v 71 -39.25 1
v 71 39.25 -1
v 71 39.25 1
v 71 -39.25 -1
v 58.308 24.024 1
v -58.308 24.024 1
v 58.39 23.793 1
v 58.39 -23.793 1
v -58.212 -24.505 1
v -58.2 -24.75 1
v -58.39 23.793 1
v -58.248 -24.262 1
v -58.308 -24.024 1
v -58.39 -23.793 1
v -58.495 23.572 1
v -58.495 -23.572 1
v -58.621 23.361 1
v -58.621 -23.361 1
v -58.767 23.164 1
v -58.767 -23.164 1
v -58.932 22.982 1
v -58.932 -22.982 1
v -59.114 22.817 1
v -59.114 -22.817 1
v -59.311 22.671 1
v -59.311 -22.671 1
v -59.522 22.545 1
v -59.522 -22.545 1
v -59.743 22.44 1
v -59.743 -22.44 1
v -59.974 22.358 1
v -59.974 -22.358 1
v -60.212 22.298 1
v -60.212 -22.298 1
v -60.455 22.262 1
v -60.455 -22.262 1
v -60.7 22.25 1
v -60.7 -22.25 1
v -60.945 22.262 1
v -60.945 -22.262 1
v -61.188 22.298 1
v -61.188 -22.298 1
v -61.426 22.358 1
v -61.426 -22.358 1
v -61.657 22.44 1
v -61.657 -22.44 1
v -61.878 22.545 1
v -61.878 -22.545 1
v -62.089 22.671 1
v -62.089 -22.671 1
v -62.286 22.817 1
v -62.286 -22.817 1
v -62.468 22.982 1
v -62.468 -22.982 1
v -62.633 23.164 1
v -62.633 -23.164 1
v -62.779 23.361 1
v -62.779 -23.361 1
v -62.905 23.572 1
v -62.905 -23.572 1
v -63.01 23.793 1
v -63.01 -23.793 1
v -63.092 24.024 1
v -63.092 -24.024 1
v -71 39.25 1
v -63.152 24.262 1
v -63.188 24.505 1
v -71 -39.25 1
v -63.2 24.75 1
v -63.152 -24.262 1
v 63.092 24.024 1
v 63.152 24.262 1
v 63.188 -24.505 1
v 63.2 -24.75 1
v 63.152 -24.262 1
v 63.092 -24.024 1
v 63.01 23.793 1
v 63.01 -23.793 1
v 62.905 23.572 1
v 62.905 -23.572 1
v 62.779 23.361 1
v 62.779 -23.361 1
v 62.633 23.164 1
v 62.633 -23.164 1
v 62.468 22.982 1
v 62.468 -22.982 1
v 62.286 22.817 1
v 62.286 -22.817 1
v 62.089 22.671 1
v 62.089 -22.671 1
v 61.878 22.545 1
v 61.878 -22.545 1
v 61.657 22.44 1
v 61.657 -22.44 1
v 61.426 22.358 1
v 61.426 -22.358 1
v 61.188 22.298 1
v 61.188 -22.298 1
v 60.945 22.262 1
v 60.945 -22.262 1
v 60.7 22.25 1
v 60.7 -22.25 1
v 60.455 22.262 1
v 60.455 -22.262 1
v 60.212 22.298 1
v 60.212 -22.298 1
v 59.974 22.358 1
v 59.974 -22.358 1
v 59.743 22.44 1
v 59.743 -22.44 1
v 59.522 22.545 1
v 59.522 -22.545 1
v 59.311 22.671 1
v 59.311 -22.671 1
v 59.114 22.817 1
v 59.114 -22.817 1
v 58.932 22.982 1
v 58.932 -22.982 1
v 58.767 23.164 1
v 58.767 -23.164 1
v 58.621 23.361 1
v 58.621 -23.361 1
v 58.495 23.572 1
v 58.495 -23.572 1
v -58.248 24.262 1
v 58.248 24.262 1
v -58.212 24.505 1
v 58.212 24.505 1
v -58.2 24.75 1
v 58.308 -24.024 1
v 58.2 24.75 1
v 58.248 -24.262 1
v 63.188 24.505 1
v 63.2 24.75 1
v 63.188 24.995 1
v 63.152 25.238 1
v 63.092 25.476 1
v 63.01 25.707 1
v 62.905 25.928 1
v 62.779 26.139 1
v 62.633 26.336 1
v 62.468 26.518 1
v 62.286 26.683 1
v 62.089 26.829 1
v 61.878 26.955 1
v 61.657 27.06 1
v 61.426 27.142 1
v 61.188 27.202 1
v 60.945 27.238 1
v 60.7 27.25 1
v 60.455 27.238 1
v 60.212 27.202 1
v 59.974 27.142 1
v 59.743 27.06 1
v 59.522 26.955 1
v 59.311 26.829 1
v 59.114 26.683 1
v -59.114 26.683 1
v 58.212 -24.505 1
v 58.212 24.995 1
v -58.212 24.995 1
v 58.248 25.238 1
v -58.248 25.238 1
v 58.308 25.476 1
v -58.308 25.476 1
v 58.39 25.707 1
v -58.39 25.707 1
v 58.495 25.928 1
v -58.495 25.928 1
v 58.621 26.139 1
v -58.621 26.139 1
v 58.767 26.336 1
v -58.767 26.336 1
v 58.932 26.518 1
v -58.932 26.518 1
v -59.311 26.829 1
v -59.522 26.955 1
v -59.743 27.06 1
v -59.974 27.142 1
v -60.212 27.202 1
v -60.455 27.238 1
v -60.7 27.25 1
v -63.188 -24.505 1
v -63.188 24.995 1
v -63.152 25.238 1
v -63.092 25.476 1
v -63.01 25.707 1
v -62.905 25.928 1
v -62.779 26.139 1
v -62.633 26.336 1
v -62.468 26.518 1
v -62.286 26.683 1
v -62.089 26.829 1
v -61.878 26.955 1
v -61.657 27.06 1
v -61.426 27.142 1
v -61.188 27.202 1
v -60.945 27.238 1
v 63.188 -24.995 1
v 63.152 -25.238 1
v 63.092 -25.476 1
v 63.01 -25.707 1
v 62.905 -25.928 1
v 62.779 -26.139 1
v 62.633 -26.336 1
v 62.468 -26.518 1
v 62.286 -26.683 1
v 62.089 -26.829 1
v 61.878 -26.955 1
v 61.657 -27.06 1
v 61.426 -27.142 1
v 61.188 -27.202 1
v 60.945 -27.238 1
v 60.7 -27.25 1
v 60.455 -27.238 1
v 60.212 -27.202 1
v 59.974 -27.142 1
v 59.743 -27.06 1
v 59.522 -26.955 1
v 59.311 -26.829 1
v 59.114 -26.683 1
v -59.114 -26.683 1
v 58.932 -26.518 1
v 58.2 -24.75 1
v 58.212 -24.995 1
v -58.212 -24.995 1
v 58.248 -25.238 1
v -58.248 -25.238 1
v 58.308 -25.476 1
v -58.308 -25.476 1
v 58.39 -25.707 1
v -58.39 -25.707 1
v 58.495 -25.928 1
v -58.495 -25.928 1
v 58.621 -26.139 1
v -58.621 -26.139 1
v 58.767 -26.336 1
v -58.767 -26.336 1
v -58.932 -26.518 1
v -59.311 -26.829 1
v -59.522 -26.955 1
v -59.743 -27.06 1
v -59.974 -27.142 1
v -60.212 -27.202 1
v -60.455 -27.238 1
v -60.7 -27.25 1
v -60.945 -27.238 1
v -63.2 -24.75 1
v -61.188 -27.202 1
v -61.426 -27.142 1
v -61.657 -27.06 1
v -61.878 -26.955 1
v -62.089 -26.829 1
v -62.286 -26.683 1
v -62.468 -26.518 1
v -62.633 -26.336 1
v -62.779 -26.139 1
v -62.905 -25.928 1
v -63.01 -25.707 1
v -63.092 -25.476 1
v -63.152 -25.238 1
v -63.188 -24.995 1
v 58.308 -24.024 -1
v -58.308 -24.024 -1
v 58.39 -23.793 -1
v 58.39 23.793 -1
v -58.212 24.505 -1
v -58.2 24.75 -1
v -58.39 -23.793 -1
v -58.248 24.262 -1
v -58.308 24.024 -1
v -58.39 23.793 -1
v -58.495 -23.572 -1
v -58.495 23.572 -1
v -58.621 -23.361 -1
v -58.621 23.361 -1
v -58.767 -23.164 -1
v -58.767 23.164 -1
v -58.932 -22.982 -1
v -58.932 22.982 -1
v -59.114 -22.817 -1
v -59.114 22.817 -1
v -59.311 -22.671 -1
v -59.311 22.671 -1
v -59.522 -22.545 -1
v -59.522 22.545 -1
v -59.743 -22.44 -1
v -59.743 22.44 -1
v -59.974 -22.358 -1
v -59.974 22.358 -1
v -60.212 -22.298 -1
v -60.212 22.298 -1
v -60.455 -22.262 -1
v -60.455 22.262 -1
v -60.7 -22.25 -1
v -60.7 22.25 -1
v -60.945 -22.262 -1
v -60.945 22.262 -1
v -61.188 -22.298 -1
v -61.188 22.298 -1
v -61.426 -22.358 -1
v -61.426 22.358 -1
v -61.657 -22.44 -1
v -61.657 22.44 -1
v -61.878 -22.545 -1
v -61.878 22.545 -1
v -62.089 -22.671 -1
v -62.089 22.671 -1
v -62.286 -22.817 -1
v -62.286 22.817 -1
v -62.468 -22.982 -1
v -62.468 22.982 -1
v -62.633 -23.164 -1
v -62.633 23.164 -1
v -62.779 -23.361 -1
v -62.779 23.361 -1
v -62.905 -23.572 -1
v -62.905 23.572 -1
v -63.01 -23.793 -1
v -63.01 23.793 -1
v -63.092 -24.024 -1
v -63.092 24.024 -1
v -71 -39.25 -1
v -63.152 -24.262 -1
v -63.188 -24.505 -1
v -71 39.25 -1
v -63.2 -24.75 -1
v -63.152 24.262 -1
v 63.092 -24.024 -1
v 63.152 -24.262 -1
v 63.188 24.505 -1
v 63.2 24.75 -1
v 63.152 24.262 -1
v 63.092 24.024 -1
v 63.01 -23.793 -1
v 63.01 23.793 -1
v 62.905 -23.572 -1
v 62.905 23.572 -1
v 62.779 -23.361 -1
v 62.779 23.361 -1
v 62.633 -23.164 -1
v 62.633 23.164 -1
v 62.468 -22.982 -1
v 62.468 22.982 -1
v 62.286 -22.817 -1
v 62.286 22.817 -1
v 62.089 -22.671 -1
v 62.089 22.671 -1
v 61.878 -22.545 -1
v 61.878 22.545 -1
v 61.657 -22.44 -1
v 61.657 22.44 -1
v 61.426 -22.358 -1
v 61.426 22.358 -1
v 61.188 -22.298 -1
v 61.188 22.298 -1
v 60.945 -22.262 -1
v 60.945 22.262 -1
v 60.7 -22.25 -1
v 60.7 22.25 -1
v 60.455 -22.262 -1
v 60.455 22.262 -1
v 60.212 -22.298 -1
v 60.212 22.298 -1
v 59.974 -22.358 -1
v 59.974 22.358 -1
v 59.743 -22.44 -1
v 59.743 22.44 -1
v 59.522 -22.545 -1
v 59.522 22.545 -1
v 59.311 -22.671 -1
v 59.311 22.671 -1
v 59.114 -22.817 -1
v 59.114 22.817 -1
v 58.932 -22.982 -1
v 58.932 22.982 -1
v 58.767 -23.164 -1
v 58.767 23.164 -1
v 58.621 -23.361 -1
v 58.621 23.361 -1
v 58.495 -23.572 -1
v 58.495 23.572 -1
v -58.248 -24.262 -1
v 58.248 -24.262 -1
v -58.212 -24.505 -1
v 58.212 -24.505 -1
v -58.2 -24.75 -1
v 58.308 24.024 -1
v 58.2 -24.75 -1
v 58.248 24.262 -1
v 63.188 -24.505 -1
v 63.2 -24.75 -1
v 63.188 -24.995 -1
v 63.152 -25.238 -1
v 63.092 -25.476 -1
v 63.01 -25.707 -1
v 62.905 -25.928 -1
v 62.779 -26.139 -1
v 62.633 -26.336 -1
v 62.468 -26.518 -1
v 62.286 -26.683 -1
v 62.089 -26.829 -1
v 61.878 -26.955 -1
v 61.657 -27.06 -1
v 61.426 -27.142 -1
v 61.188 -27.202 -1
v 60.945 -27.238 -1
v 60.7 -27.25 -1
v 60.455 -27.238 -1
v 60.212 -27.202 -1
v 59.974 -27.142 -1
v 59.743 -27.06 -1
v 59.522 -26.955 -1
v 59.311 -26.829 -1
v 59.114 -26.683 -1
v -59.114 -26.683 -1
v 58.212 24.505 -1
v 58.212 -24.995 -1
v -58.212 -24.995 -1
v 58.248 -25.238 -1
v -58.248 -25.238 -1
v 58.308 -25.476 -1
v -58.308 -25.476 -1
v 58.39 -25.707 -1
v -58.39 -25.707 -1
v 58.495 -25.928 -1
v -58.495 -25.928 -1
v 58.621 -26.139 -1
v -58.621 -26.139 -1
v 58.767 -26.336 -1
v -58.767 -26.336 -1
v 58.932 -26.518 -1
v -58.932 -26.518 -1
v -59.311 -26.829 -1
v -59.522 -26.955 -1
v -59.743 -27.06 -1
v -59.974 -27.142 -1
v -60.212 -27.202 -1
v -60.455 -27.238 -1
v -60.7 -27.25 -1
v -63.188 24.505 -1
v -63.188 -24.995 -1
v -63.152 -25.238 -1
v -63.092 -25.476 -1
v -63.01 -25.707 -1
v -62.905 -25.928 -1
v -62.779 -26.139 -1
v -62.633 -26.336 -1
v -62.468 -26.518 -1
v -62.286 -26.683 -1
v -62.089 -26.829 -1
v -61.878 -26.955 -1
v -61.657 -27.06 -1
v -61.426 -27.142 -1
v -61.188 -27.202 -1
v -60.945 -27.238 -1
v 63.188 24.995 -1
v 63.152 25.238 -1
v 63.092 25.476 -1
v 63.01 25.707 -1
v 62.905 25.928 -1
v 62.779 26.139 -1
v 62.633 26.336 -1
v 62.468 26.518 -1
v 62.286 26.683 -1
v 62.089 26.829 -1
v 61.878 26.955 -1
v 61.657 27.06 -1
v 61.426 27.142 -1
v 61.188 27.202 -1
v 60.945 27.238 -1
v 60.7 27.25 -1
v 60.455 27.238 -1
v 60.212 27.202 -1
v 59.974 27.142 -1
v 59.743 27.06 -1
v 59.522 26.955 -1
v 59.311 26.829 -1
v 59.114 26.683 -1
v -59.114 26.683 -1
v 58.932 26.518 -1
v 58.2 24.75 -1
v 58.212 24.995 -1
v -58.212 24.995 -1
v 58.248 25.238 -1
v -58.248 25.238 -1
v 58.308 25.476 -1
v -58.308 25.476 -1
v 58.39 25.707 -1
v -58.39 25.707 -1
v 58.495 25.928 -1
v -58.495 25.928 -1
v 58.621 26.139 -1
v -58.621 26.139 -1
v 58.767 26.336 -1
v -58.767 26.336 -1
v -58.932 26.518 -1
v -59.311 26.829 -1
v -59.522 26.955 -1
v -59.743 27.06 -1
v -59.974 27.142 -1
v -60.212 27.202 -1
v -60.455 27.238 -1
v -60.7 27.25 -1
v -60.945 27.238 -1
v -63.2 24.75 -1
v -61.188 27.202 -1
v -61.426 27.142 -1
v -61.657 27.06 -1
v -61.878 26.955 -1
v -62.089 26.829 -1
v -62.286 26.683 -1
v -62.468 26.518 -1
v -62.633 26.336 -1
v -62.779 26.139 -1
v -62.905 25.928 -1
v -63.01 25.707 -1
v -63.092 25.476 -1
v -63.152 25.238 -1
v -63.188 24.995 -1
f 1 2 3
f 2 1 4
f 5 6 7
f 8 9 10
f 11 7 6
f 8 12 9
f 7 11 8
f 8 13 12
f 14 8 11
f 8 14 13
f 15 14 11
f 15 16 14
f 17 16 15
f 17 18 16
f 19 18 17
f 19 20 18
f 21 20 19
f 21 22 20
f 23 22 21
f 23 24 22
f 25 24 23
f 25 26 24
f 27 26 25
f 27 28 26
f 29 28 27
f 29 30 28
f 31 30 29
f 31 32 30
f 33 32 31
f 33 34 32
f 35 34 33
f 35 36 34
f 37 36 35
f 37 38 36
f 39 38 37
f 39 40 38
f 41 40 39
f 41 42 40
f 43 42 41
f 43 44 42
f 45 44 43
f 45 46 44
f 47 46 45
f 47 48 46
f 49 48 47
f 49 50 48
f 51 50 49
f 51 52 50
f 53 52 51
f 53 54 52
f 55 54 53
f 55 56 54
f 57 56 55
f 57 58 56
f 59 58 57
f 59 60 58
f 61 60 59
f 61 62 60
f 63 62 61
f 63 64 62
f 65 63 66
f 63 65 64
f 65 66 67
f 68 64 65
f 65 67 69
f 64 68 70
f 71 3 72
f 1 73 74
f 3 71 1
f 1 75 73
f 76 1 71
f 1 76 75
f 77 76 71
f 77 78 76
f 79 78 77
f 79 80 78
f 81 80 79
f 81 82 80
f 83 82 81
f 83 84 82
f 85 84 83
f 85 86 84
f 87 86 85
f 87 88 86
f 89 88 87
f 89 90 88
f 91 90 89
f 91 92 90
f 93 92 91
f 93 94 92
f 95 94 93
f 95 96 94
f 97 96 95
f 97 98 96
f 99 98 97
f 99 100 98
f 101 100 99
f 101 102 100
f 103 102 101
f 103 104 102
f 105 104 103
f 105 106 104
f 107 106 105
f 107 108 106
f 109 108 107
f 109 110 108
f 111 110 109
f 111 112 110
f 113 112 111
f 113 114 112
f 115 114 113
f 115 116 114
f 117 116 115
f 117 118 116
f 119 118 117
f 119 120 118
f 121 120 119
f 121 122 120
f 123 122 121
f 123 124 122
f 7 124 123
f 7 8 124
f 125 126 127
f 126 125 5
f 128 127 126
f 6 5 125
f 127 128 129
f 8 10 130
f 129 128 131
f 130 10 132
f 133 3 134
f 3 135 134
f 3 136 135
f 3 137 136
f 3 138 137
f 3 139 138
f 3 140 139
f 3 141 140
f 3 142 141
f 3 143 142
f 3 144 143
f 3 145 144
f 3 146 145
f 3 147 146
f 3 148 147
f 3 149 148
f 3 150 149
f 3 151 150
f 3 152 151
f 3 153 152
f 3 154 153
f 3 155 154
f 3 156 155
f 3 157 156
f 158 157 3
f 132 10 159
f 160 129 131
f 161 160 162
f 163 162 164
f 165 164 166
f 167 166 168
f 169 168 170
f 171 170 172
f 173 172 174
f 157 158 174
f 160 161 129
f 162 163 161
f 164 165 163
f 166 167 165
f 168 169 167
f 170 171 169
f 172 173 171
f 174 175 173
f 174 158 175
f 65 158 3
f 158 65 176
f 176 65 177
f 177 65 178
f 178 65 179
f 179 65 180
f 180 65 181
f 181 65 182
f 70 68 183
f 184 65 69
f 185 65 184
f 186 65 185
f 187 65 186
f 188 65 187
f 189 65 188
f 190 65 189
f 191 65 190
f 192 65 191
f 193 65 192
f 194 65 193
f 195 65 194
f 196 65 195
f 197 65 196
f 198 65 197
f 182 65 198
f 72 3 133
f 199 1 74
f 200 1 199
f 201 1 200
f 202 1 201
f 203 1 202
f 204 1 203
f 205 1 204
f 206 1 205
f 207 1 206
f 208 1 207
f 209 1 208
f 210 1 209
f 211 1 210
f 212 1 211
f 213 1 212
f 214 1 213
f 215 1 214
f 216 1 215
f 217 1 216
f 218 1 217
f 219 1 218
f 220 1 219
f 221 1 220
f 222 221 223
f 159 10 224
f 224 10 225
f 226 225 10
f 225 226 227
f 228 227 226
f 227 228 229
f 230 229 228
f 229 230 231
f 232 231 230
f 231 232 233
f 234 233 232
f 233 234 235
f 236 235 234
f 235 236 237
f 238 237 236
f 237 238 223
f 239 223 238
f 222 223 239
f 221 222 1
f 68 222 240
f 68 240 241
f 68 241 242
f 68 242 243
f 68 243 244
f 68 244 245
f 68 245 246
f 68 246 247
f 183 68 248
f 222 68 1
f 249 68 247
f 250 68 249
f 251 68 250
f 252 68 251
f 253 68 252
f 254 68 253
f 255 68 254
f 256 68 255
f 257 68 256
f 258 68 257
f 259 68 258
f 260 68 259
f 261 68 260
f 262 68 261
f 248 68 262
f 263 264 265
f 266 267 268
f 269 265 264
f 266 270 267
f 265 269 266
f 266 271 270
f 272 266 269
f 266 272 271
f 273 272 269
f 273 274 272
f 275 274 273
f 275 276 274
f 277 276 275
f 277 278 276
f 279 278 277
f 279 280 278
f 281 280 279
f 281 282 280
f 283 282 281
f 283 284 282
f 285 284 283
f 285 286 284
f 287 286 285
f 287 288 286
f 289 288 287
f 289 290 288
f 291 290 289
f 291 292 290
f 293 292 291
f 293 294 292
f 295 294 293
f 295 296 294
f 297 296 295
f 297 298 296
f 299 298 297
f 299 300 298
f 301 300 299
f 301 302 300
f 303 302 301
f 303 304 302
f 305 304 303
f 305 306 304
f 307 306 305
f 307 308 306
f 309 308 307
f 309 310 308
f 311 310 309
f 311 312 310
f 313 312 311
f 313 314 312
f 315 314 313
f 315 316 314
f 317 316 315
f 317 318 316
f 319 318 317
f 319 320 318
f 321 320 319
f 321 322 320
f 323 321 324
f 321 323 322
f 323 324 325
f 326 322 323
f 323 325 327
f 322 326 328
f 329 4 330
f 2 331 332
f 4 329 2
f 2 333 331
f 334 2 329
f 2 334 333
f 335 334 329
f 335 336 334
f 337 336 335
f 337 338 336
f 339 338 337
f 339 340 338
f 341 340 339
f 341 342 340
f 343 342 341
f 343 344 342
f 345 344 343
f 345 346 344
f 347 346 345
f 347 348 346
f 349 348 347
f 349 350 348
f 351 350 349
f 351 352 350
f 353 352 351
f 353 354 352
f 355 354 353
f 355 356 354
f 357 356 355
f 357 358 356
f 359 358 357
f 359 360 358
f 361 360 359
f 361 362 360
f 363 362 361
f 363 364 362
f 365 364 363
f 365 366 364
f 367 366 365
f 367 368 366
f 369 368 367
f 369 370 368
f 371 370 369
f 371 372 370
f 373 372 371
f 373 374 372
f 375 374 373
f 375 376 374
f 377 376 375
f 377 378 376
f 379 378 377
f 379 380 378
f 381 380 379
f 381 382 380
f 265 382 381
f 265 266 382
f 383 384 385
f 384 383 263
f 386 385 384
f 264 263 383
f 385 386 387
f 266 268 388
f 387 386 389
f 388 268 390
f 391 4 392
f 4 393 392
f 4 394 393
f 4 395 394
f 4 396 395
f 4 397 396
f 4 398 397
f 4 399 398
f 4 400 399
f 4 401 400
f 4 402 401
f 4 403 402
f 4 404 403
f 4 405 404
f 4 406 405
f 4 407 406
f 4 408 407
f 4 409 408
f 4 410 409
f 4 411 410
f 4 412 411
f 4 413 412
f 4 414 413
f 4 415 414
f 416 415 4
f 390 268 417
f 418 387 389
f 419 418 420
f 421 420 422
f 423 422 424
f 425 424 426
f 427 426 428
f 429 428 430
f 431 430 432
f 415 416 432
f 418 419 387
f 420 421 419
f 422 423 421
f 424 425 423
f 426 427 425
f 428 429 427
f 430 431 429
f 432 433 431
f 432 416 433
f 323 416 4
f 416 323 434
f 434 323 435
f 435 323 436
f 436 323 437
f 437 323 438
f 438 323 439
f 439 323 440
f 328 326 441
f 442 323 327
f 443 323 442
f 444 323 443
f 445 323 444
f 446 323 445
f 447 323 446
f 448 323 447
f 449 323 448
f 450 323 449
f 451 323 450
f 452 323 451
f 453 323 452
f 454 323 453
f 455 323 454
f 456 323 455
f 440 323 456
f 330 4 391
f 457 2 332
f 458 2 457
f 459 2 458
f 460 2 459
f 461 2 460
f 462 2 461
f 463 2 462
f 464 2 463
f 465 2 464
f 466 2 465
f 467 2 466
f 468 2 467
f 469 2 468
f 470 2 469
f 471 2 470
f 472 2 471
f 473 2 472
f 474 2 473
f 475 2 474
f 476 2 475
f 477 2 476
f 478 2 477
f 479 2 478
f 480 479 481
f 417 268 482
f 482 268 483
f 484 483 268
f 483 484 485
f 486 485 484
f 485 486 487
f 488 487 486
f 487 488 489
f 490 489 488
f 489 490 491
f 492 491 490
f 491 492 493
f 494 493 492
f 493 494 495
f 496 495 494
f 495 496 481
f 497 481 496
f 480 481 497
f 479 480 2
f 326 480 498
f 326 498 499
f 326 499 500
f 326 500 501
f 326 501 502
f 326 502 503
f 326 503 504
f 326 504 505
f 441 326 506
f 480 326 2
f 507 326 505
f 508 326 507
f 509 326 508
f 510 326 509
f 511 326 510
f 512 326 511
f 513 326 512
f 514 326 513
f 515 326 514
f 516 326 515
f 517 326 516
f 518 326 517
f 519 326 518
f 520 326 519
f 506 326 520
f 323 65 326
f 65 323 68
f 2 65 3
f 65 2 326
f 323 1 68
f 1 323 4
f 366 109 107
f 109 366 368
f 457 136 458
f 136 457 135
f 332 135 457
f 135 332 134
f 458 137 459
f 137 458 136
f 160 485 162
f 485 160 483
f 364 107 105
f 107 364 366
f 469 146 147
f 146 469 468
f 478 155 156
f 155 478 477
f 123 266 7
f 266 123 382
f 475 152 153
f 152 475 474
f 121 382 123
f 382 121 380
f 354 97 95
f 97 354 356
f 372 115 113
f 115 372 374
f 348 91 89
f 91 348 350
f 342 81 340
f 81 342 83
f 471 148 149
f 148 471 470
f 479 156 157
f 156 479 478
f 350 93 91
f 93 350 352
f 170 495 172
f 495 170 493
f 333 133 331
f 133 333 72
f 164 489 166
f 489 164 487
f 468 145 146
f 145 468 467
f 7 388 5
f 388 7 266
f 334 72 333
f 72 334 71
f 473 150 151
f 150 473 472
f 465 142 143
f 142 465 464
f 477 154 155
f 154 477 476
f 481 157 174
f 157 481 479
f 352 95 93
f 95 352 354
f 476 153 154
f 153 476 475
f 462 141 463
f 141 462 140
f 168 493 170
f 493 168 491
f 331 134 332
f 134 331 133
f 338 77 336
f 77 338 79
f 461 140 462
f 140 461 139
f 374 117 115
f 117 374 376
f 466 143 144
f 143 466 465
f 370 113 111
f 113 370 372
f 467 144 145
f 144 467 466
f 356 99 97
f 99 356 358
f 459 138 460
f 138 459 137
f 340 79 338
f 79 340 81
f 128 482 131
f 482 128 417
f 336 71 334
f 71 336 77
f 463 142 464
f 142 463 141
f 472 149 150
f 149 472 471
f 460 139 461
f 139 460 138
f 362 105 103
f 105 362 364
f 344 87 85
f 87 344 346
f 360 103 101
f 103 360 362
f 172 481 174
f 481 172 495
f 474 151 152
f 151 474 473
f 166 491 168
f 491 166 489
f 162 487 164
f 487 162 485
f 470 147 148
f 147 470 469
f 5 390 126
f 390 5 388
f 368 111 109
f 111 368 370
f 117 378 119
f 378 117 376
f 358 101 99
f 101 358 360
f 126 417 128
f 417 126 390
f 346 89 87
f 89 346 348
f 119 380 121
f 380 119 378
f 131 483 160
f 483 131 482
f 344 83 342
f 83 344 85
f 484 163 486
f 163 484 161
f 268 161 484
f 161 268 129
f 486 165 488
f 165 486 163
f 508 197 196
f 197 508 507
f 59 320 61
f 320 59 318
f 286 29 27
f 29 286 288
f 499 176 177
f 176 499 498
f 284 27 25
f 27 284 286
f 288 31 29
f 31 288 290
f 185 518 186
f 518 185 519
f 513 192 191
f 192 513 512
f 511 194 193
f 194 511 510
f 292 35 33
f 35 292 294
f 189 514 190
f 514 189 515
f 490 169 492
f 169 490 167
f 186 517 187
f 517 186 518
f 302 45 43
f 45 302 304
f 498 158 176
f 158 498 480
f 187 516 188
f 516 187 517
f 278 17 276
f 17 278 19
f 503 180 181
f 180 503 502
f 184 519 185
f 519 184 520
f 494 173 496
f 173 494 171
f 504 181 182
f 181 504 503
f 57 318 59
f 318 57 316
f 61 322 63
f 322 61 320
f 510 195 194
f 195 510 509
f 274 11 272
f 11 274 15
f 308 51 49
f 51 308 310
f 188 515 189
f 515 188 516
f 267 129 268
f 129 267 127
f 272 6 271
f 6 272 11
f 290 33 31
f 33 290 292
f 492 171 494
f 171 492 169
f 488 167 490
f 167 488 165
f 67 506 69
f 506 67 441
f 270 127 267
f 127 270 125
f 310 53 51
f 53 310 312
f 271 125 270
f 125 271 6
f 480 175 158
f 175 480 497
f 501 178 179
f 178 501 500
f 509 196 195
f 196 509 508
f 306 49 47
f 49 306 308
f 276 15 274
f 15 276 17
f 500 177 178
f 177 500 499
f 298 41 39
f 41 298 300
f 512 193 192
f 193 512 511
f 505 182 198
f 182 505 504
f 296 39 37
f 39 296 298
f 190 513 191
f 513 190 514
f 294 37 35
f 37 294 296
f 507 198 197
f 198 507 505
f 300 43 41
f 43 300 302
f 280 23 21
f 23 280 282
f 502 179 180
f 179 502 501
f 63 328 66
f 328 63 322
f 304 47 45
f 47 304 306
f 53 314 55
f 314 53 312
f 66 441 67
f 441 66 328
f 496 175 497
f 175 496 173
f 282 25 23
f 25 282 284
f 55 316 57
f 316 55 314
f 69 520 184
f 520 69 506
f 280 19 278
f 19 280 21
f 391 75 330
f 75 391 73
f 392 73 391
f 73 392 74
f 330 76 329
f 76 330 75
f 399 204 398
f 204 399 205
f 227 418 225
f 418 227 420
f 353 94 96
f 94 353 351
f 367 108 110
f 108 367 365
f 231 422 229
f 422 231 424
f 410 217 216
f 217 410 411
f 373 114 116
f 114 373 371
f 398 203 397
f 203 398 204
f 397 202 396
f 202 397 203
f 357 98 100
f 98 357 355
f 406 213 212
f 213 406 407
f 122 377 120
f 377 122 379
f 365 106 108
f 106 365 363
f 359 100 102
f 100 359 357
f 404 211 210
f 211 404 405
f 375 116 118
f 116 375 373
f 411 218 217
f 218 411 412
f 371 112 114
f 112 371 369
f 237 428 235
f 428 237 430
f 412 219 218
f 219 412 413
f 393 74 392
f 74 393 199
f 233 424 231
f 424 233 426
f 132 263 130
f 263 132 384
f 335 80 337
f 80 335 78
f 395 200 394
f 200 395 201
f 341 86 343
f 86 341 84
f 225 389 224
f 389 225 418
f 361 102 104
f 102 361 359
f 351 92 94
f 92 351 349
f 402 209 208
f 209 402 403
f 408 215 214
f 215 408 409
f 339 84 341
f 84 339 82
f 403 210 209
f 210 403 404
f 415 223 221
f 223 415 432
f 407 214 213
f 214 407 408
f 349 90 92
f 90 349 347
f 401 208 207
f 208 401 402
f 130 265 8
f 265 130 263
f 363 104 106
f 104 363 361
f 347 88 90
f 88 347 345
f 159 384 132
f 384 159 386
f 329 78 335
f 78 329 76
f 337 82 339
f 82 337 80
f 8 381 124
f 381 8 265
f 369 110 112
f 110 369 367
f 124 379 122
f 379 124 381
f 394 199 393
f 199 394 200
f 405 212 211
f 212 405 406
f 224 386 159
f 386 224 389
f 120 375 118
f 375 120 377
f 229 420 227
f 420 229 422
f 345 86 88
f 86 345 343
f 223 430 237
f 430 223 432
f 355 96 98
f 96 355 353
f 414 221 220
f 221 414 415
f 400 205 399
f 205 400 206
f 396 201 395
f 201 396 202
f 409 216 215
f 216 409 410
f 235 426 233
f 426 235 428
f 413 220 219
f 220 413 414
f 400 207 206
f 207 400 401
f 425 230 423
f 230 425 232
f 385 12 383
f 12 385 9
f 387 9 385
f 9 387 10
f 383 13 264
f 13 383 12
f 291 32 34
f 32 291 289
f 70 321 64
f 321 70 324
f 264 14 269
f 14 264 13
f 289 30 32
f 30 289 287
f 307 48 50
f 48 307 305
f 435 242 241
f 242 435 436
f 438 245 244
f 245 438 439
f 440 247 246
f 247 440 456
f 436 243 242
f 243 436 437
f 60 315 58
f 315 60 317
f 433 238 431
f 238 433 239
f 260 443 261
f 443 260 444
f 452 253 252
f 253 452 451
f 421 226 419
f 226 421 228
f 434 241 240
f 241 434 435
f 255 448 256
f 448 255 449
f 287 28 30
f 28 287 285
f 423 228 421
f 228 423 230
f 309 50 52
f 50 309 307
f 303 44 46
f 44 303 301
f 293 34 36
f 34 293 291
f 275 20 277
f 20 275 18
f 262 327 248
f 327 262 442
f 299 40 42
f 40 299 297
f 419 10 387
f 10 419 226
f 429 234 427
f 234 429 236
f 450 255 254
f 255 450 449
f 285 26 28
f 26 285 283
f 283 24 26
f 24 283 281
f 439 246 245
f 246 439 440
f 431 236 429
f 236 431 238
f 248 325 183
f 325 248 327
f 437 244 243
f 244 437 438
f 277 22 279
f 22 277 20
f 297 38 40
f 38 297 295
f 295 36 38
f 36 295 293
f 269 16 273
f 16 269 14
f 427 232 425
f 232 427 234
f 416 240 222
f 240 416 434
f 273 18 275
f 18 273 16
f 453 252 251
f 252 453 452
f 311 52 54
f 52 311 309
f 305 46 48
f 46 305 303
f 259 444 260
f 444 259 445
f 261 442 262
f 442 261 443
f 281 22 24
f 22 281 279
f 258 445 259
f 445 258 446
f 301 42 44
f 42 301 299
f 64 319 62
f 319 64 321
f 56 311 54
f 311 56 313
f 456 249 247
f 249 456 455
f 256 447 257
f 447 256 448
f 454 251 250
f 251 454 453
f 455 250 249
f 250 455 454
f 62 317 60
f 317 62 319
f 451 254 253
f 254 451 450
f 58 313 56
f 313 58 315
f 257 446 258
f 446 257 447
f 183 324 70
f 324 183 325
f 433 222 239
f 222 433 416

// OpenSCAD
//Make this as functions so accessable outside of file
function mountplate_depth()=78.5;
function mountplate_width()=142;
function mountplate_thickness()=2;

module mountplate()
{
    hole_diameter=5;
    hole_frontback=12+hole_diameter/2;
    hole_side=7.8+hole_diameter/2;
    
    thickness=mountplate_thickness();
    width=mountplate_width();
    depth=mountplate_depth();
    
    hole_x=width/2-hole_side;
    hole_y=depth/2-hole_frontback;
    
    difference()
    {
        cube([width,depth,thickness],center=true);
        translate([hole_x,hole_y,0])cylinder(d=hole_diameter,h=thickness,center=true,$fn=64);
        translate([-hole_x,hole_y,0])cylinder(d=hole_diameter,h=thickness,center=true,$fn=64);
        translate([hole_x,-hole_y,0])cylinder(d=hole_diameter,h=thickness,center=true,$fn=64);
        translate([-hole_x,-hole_y,0])cylinder(d=hole_diameter,h=thickness,center=true,$fn=64);
    }
    
    
    
}

mountplate();
